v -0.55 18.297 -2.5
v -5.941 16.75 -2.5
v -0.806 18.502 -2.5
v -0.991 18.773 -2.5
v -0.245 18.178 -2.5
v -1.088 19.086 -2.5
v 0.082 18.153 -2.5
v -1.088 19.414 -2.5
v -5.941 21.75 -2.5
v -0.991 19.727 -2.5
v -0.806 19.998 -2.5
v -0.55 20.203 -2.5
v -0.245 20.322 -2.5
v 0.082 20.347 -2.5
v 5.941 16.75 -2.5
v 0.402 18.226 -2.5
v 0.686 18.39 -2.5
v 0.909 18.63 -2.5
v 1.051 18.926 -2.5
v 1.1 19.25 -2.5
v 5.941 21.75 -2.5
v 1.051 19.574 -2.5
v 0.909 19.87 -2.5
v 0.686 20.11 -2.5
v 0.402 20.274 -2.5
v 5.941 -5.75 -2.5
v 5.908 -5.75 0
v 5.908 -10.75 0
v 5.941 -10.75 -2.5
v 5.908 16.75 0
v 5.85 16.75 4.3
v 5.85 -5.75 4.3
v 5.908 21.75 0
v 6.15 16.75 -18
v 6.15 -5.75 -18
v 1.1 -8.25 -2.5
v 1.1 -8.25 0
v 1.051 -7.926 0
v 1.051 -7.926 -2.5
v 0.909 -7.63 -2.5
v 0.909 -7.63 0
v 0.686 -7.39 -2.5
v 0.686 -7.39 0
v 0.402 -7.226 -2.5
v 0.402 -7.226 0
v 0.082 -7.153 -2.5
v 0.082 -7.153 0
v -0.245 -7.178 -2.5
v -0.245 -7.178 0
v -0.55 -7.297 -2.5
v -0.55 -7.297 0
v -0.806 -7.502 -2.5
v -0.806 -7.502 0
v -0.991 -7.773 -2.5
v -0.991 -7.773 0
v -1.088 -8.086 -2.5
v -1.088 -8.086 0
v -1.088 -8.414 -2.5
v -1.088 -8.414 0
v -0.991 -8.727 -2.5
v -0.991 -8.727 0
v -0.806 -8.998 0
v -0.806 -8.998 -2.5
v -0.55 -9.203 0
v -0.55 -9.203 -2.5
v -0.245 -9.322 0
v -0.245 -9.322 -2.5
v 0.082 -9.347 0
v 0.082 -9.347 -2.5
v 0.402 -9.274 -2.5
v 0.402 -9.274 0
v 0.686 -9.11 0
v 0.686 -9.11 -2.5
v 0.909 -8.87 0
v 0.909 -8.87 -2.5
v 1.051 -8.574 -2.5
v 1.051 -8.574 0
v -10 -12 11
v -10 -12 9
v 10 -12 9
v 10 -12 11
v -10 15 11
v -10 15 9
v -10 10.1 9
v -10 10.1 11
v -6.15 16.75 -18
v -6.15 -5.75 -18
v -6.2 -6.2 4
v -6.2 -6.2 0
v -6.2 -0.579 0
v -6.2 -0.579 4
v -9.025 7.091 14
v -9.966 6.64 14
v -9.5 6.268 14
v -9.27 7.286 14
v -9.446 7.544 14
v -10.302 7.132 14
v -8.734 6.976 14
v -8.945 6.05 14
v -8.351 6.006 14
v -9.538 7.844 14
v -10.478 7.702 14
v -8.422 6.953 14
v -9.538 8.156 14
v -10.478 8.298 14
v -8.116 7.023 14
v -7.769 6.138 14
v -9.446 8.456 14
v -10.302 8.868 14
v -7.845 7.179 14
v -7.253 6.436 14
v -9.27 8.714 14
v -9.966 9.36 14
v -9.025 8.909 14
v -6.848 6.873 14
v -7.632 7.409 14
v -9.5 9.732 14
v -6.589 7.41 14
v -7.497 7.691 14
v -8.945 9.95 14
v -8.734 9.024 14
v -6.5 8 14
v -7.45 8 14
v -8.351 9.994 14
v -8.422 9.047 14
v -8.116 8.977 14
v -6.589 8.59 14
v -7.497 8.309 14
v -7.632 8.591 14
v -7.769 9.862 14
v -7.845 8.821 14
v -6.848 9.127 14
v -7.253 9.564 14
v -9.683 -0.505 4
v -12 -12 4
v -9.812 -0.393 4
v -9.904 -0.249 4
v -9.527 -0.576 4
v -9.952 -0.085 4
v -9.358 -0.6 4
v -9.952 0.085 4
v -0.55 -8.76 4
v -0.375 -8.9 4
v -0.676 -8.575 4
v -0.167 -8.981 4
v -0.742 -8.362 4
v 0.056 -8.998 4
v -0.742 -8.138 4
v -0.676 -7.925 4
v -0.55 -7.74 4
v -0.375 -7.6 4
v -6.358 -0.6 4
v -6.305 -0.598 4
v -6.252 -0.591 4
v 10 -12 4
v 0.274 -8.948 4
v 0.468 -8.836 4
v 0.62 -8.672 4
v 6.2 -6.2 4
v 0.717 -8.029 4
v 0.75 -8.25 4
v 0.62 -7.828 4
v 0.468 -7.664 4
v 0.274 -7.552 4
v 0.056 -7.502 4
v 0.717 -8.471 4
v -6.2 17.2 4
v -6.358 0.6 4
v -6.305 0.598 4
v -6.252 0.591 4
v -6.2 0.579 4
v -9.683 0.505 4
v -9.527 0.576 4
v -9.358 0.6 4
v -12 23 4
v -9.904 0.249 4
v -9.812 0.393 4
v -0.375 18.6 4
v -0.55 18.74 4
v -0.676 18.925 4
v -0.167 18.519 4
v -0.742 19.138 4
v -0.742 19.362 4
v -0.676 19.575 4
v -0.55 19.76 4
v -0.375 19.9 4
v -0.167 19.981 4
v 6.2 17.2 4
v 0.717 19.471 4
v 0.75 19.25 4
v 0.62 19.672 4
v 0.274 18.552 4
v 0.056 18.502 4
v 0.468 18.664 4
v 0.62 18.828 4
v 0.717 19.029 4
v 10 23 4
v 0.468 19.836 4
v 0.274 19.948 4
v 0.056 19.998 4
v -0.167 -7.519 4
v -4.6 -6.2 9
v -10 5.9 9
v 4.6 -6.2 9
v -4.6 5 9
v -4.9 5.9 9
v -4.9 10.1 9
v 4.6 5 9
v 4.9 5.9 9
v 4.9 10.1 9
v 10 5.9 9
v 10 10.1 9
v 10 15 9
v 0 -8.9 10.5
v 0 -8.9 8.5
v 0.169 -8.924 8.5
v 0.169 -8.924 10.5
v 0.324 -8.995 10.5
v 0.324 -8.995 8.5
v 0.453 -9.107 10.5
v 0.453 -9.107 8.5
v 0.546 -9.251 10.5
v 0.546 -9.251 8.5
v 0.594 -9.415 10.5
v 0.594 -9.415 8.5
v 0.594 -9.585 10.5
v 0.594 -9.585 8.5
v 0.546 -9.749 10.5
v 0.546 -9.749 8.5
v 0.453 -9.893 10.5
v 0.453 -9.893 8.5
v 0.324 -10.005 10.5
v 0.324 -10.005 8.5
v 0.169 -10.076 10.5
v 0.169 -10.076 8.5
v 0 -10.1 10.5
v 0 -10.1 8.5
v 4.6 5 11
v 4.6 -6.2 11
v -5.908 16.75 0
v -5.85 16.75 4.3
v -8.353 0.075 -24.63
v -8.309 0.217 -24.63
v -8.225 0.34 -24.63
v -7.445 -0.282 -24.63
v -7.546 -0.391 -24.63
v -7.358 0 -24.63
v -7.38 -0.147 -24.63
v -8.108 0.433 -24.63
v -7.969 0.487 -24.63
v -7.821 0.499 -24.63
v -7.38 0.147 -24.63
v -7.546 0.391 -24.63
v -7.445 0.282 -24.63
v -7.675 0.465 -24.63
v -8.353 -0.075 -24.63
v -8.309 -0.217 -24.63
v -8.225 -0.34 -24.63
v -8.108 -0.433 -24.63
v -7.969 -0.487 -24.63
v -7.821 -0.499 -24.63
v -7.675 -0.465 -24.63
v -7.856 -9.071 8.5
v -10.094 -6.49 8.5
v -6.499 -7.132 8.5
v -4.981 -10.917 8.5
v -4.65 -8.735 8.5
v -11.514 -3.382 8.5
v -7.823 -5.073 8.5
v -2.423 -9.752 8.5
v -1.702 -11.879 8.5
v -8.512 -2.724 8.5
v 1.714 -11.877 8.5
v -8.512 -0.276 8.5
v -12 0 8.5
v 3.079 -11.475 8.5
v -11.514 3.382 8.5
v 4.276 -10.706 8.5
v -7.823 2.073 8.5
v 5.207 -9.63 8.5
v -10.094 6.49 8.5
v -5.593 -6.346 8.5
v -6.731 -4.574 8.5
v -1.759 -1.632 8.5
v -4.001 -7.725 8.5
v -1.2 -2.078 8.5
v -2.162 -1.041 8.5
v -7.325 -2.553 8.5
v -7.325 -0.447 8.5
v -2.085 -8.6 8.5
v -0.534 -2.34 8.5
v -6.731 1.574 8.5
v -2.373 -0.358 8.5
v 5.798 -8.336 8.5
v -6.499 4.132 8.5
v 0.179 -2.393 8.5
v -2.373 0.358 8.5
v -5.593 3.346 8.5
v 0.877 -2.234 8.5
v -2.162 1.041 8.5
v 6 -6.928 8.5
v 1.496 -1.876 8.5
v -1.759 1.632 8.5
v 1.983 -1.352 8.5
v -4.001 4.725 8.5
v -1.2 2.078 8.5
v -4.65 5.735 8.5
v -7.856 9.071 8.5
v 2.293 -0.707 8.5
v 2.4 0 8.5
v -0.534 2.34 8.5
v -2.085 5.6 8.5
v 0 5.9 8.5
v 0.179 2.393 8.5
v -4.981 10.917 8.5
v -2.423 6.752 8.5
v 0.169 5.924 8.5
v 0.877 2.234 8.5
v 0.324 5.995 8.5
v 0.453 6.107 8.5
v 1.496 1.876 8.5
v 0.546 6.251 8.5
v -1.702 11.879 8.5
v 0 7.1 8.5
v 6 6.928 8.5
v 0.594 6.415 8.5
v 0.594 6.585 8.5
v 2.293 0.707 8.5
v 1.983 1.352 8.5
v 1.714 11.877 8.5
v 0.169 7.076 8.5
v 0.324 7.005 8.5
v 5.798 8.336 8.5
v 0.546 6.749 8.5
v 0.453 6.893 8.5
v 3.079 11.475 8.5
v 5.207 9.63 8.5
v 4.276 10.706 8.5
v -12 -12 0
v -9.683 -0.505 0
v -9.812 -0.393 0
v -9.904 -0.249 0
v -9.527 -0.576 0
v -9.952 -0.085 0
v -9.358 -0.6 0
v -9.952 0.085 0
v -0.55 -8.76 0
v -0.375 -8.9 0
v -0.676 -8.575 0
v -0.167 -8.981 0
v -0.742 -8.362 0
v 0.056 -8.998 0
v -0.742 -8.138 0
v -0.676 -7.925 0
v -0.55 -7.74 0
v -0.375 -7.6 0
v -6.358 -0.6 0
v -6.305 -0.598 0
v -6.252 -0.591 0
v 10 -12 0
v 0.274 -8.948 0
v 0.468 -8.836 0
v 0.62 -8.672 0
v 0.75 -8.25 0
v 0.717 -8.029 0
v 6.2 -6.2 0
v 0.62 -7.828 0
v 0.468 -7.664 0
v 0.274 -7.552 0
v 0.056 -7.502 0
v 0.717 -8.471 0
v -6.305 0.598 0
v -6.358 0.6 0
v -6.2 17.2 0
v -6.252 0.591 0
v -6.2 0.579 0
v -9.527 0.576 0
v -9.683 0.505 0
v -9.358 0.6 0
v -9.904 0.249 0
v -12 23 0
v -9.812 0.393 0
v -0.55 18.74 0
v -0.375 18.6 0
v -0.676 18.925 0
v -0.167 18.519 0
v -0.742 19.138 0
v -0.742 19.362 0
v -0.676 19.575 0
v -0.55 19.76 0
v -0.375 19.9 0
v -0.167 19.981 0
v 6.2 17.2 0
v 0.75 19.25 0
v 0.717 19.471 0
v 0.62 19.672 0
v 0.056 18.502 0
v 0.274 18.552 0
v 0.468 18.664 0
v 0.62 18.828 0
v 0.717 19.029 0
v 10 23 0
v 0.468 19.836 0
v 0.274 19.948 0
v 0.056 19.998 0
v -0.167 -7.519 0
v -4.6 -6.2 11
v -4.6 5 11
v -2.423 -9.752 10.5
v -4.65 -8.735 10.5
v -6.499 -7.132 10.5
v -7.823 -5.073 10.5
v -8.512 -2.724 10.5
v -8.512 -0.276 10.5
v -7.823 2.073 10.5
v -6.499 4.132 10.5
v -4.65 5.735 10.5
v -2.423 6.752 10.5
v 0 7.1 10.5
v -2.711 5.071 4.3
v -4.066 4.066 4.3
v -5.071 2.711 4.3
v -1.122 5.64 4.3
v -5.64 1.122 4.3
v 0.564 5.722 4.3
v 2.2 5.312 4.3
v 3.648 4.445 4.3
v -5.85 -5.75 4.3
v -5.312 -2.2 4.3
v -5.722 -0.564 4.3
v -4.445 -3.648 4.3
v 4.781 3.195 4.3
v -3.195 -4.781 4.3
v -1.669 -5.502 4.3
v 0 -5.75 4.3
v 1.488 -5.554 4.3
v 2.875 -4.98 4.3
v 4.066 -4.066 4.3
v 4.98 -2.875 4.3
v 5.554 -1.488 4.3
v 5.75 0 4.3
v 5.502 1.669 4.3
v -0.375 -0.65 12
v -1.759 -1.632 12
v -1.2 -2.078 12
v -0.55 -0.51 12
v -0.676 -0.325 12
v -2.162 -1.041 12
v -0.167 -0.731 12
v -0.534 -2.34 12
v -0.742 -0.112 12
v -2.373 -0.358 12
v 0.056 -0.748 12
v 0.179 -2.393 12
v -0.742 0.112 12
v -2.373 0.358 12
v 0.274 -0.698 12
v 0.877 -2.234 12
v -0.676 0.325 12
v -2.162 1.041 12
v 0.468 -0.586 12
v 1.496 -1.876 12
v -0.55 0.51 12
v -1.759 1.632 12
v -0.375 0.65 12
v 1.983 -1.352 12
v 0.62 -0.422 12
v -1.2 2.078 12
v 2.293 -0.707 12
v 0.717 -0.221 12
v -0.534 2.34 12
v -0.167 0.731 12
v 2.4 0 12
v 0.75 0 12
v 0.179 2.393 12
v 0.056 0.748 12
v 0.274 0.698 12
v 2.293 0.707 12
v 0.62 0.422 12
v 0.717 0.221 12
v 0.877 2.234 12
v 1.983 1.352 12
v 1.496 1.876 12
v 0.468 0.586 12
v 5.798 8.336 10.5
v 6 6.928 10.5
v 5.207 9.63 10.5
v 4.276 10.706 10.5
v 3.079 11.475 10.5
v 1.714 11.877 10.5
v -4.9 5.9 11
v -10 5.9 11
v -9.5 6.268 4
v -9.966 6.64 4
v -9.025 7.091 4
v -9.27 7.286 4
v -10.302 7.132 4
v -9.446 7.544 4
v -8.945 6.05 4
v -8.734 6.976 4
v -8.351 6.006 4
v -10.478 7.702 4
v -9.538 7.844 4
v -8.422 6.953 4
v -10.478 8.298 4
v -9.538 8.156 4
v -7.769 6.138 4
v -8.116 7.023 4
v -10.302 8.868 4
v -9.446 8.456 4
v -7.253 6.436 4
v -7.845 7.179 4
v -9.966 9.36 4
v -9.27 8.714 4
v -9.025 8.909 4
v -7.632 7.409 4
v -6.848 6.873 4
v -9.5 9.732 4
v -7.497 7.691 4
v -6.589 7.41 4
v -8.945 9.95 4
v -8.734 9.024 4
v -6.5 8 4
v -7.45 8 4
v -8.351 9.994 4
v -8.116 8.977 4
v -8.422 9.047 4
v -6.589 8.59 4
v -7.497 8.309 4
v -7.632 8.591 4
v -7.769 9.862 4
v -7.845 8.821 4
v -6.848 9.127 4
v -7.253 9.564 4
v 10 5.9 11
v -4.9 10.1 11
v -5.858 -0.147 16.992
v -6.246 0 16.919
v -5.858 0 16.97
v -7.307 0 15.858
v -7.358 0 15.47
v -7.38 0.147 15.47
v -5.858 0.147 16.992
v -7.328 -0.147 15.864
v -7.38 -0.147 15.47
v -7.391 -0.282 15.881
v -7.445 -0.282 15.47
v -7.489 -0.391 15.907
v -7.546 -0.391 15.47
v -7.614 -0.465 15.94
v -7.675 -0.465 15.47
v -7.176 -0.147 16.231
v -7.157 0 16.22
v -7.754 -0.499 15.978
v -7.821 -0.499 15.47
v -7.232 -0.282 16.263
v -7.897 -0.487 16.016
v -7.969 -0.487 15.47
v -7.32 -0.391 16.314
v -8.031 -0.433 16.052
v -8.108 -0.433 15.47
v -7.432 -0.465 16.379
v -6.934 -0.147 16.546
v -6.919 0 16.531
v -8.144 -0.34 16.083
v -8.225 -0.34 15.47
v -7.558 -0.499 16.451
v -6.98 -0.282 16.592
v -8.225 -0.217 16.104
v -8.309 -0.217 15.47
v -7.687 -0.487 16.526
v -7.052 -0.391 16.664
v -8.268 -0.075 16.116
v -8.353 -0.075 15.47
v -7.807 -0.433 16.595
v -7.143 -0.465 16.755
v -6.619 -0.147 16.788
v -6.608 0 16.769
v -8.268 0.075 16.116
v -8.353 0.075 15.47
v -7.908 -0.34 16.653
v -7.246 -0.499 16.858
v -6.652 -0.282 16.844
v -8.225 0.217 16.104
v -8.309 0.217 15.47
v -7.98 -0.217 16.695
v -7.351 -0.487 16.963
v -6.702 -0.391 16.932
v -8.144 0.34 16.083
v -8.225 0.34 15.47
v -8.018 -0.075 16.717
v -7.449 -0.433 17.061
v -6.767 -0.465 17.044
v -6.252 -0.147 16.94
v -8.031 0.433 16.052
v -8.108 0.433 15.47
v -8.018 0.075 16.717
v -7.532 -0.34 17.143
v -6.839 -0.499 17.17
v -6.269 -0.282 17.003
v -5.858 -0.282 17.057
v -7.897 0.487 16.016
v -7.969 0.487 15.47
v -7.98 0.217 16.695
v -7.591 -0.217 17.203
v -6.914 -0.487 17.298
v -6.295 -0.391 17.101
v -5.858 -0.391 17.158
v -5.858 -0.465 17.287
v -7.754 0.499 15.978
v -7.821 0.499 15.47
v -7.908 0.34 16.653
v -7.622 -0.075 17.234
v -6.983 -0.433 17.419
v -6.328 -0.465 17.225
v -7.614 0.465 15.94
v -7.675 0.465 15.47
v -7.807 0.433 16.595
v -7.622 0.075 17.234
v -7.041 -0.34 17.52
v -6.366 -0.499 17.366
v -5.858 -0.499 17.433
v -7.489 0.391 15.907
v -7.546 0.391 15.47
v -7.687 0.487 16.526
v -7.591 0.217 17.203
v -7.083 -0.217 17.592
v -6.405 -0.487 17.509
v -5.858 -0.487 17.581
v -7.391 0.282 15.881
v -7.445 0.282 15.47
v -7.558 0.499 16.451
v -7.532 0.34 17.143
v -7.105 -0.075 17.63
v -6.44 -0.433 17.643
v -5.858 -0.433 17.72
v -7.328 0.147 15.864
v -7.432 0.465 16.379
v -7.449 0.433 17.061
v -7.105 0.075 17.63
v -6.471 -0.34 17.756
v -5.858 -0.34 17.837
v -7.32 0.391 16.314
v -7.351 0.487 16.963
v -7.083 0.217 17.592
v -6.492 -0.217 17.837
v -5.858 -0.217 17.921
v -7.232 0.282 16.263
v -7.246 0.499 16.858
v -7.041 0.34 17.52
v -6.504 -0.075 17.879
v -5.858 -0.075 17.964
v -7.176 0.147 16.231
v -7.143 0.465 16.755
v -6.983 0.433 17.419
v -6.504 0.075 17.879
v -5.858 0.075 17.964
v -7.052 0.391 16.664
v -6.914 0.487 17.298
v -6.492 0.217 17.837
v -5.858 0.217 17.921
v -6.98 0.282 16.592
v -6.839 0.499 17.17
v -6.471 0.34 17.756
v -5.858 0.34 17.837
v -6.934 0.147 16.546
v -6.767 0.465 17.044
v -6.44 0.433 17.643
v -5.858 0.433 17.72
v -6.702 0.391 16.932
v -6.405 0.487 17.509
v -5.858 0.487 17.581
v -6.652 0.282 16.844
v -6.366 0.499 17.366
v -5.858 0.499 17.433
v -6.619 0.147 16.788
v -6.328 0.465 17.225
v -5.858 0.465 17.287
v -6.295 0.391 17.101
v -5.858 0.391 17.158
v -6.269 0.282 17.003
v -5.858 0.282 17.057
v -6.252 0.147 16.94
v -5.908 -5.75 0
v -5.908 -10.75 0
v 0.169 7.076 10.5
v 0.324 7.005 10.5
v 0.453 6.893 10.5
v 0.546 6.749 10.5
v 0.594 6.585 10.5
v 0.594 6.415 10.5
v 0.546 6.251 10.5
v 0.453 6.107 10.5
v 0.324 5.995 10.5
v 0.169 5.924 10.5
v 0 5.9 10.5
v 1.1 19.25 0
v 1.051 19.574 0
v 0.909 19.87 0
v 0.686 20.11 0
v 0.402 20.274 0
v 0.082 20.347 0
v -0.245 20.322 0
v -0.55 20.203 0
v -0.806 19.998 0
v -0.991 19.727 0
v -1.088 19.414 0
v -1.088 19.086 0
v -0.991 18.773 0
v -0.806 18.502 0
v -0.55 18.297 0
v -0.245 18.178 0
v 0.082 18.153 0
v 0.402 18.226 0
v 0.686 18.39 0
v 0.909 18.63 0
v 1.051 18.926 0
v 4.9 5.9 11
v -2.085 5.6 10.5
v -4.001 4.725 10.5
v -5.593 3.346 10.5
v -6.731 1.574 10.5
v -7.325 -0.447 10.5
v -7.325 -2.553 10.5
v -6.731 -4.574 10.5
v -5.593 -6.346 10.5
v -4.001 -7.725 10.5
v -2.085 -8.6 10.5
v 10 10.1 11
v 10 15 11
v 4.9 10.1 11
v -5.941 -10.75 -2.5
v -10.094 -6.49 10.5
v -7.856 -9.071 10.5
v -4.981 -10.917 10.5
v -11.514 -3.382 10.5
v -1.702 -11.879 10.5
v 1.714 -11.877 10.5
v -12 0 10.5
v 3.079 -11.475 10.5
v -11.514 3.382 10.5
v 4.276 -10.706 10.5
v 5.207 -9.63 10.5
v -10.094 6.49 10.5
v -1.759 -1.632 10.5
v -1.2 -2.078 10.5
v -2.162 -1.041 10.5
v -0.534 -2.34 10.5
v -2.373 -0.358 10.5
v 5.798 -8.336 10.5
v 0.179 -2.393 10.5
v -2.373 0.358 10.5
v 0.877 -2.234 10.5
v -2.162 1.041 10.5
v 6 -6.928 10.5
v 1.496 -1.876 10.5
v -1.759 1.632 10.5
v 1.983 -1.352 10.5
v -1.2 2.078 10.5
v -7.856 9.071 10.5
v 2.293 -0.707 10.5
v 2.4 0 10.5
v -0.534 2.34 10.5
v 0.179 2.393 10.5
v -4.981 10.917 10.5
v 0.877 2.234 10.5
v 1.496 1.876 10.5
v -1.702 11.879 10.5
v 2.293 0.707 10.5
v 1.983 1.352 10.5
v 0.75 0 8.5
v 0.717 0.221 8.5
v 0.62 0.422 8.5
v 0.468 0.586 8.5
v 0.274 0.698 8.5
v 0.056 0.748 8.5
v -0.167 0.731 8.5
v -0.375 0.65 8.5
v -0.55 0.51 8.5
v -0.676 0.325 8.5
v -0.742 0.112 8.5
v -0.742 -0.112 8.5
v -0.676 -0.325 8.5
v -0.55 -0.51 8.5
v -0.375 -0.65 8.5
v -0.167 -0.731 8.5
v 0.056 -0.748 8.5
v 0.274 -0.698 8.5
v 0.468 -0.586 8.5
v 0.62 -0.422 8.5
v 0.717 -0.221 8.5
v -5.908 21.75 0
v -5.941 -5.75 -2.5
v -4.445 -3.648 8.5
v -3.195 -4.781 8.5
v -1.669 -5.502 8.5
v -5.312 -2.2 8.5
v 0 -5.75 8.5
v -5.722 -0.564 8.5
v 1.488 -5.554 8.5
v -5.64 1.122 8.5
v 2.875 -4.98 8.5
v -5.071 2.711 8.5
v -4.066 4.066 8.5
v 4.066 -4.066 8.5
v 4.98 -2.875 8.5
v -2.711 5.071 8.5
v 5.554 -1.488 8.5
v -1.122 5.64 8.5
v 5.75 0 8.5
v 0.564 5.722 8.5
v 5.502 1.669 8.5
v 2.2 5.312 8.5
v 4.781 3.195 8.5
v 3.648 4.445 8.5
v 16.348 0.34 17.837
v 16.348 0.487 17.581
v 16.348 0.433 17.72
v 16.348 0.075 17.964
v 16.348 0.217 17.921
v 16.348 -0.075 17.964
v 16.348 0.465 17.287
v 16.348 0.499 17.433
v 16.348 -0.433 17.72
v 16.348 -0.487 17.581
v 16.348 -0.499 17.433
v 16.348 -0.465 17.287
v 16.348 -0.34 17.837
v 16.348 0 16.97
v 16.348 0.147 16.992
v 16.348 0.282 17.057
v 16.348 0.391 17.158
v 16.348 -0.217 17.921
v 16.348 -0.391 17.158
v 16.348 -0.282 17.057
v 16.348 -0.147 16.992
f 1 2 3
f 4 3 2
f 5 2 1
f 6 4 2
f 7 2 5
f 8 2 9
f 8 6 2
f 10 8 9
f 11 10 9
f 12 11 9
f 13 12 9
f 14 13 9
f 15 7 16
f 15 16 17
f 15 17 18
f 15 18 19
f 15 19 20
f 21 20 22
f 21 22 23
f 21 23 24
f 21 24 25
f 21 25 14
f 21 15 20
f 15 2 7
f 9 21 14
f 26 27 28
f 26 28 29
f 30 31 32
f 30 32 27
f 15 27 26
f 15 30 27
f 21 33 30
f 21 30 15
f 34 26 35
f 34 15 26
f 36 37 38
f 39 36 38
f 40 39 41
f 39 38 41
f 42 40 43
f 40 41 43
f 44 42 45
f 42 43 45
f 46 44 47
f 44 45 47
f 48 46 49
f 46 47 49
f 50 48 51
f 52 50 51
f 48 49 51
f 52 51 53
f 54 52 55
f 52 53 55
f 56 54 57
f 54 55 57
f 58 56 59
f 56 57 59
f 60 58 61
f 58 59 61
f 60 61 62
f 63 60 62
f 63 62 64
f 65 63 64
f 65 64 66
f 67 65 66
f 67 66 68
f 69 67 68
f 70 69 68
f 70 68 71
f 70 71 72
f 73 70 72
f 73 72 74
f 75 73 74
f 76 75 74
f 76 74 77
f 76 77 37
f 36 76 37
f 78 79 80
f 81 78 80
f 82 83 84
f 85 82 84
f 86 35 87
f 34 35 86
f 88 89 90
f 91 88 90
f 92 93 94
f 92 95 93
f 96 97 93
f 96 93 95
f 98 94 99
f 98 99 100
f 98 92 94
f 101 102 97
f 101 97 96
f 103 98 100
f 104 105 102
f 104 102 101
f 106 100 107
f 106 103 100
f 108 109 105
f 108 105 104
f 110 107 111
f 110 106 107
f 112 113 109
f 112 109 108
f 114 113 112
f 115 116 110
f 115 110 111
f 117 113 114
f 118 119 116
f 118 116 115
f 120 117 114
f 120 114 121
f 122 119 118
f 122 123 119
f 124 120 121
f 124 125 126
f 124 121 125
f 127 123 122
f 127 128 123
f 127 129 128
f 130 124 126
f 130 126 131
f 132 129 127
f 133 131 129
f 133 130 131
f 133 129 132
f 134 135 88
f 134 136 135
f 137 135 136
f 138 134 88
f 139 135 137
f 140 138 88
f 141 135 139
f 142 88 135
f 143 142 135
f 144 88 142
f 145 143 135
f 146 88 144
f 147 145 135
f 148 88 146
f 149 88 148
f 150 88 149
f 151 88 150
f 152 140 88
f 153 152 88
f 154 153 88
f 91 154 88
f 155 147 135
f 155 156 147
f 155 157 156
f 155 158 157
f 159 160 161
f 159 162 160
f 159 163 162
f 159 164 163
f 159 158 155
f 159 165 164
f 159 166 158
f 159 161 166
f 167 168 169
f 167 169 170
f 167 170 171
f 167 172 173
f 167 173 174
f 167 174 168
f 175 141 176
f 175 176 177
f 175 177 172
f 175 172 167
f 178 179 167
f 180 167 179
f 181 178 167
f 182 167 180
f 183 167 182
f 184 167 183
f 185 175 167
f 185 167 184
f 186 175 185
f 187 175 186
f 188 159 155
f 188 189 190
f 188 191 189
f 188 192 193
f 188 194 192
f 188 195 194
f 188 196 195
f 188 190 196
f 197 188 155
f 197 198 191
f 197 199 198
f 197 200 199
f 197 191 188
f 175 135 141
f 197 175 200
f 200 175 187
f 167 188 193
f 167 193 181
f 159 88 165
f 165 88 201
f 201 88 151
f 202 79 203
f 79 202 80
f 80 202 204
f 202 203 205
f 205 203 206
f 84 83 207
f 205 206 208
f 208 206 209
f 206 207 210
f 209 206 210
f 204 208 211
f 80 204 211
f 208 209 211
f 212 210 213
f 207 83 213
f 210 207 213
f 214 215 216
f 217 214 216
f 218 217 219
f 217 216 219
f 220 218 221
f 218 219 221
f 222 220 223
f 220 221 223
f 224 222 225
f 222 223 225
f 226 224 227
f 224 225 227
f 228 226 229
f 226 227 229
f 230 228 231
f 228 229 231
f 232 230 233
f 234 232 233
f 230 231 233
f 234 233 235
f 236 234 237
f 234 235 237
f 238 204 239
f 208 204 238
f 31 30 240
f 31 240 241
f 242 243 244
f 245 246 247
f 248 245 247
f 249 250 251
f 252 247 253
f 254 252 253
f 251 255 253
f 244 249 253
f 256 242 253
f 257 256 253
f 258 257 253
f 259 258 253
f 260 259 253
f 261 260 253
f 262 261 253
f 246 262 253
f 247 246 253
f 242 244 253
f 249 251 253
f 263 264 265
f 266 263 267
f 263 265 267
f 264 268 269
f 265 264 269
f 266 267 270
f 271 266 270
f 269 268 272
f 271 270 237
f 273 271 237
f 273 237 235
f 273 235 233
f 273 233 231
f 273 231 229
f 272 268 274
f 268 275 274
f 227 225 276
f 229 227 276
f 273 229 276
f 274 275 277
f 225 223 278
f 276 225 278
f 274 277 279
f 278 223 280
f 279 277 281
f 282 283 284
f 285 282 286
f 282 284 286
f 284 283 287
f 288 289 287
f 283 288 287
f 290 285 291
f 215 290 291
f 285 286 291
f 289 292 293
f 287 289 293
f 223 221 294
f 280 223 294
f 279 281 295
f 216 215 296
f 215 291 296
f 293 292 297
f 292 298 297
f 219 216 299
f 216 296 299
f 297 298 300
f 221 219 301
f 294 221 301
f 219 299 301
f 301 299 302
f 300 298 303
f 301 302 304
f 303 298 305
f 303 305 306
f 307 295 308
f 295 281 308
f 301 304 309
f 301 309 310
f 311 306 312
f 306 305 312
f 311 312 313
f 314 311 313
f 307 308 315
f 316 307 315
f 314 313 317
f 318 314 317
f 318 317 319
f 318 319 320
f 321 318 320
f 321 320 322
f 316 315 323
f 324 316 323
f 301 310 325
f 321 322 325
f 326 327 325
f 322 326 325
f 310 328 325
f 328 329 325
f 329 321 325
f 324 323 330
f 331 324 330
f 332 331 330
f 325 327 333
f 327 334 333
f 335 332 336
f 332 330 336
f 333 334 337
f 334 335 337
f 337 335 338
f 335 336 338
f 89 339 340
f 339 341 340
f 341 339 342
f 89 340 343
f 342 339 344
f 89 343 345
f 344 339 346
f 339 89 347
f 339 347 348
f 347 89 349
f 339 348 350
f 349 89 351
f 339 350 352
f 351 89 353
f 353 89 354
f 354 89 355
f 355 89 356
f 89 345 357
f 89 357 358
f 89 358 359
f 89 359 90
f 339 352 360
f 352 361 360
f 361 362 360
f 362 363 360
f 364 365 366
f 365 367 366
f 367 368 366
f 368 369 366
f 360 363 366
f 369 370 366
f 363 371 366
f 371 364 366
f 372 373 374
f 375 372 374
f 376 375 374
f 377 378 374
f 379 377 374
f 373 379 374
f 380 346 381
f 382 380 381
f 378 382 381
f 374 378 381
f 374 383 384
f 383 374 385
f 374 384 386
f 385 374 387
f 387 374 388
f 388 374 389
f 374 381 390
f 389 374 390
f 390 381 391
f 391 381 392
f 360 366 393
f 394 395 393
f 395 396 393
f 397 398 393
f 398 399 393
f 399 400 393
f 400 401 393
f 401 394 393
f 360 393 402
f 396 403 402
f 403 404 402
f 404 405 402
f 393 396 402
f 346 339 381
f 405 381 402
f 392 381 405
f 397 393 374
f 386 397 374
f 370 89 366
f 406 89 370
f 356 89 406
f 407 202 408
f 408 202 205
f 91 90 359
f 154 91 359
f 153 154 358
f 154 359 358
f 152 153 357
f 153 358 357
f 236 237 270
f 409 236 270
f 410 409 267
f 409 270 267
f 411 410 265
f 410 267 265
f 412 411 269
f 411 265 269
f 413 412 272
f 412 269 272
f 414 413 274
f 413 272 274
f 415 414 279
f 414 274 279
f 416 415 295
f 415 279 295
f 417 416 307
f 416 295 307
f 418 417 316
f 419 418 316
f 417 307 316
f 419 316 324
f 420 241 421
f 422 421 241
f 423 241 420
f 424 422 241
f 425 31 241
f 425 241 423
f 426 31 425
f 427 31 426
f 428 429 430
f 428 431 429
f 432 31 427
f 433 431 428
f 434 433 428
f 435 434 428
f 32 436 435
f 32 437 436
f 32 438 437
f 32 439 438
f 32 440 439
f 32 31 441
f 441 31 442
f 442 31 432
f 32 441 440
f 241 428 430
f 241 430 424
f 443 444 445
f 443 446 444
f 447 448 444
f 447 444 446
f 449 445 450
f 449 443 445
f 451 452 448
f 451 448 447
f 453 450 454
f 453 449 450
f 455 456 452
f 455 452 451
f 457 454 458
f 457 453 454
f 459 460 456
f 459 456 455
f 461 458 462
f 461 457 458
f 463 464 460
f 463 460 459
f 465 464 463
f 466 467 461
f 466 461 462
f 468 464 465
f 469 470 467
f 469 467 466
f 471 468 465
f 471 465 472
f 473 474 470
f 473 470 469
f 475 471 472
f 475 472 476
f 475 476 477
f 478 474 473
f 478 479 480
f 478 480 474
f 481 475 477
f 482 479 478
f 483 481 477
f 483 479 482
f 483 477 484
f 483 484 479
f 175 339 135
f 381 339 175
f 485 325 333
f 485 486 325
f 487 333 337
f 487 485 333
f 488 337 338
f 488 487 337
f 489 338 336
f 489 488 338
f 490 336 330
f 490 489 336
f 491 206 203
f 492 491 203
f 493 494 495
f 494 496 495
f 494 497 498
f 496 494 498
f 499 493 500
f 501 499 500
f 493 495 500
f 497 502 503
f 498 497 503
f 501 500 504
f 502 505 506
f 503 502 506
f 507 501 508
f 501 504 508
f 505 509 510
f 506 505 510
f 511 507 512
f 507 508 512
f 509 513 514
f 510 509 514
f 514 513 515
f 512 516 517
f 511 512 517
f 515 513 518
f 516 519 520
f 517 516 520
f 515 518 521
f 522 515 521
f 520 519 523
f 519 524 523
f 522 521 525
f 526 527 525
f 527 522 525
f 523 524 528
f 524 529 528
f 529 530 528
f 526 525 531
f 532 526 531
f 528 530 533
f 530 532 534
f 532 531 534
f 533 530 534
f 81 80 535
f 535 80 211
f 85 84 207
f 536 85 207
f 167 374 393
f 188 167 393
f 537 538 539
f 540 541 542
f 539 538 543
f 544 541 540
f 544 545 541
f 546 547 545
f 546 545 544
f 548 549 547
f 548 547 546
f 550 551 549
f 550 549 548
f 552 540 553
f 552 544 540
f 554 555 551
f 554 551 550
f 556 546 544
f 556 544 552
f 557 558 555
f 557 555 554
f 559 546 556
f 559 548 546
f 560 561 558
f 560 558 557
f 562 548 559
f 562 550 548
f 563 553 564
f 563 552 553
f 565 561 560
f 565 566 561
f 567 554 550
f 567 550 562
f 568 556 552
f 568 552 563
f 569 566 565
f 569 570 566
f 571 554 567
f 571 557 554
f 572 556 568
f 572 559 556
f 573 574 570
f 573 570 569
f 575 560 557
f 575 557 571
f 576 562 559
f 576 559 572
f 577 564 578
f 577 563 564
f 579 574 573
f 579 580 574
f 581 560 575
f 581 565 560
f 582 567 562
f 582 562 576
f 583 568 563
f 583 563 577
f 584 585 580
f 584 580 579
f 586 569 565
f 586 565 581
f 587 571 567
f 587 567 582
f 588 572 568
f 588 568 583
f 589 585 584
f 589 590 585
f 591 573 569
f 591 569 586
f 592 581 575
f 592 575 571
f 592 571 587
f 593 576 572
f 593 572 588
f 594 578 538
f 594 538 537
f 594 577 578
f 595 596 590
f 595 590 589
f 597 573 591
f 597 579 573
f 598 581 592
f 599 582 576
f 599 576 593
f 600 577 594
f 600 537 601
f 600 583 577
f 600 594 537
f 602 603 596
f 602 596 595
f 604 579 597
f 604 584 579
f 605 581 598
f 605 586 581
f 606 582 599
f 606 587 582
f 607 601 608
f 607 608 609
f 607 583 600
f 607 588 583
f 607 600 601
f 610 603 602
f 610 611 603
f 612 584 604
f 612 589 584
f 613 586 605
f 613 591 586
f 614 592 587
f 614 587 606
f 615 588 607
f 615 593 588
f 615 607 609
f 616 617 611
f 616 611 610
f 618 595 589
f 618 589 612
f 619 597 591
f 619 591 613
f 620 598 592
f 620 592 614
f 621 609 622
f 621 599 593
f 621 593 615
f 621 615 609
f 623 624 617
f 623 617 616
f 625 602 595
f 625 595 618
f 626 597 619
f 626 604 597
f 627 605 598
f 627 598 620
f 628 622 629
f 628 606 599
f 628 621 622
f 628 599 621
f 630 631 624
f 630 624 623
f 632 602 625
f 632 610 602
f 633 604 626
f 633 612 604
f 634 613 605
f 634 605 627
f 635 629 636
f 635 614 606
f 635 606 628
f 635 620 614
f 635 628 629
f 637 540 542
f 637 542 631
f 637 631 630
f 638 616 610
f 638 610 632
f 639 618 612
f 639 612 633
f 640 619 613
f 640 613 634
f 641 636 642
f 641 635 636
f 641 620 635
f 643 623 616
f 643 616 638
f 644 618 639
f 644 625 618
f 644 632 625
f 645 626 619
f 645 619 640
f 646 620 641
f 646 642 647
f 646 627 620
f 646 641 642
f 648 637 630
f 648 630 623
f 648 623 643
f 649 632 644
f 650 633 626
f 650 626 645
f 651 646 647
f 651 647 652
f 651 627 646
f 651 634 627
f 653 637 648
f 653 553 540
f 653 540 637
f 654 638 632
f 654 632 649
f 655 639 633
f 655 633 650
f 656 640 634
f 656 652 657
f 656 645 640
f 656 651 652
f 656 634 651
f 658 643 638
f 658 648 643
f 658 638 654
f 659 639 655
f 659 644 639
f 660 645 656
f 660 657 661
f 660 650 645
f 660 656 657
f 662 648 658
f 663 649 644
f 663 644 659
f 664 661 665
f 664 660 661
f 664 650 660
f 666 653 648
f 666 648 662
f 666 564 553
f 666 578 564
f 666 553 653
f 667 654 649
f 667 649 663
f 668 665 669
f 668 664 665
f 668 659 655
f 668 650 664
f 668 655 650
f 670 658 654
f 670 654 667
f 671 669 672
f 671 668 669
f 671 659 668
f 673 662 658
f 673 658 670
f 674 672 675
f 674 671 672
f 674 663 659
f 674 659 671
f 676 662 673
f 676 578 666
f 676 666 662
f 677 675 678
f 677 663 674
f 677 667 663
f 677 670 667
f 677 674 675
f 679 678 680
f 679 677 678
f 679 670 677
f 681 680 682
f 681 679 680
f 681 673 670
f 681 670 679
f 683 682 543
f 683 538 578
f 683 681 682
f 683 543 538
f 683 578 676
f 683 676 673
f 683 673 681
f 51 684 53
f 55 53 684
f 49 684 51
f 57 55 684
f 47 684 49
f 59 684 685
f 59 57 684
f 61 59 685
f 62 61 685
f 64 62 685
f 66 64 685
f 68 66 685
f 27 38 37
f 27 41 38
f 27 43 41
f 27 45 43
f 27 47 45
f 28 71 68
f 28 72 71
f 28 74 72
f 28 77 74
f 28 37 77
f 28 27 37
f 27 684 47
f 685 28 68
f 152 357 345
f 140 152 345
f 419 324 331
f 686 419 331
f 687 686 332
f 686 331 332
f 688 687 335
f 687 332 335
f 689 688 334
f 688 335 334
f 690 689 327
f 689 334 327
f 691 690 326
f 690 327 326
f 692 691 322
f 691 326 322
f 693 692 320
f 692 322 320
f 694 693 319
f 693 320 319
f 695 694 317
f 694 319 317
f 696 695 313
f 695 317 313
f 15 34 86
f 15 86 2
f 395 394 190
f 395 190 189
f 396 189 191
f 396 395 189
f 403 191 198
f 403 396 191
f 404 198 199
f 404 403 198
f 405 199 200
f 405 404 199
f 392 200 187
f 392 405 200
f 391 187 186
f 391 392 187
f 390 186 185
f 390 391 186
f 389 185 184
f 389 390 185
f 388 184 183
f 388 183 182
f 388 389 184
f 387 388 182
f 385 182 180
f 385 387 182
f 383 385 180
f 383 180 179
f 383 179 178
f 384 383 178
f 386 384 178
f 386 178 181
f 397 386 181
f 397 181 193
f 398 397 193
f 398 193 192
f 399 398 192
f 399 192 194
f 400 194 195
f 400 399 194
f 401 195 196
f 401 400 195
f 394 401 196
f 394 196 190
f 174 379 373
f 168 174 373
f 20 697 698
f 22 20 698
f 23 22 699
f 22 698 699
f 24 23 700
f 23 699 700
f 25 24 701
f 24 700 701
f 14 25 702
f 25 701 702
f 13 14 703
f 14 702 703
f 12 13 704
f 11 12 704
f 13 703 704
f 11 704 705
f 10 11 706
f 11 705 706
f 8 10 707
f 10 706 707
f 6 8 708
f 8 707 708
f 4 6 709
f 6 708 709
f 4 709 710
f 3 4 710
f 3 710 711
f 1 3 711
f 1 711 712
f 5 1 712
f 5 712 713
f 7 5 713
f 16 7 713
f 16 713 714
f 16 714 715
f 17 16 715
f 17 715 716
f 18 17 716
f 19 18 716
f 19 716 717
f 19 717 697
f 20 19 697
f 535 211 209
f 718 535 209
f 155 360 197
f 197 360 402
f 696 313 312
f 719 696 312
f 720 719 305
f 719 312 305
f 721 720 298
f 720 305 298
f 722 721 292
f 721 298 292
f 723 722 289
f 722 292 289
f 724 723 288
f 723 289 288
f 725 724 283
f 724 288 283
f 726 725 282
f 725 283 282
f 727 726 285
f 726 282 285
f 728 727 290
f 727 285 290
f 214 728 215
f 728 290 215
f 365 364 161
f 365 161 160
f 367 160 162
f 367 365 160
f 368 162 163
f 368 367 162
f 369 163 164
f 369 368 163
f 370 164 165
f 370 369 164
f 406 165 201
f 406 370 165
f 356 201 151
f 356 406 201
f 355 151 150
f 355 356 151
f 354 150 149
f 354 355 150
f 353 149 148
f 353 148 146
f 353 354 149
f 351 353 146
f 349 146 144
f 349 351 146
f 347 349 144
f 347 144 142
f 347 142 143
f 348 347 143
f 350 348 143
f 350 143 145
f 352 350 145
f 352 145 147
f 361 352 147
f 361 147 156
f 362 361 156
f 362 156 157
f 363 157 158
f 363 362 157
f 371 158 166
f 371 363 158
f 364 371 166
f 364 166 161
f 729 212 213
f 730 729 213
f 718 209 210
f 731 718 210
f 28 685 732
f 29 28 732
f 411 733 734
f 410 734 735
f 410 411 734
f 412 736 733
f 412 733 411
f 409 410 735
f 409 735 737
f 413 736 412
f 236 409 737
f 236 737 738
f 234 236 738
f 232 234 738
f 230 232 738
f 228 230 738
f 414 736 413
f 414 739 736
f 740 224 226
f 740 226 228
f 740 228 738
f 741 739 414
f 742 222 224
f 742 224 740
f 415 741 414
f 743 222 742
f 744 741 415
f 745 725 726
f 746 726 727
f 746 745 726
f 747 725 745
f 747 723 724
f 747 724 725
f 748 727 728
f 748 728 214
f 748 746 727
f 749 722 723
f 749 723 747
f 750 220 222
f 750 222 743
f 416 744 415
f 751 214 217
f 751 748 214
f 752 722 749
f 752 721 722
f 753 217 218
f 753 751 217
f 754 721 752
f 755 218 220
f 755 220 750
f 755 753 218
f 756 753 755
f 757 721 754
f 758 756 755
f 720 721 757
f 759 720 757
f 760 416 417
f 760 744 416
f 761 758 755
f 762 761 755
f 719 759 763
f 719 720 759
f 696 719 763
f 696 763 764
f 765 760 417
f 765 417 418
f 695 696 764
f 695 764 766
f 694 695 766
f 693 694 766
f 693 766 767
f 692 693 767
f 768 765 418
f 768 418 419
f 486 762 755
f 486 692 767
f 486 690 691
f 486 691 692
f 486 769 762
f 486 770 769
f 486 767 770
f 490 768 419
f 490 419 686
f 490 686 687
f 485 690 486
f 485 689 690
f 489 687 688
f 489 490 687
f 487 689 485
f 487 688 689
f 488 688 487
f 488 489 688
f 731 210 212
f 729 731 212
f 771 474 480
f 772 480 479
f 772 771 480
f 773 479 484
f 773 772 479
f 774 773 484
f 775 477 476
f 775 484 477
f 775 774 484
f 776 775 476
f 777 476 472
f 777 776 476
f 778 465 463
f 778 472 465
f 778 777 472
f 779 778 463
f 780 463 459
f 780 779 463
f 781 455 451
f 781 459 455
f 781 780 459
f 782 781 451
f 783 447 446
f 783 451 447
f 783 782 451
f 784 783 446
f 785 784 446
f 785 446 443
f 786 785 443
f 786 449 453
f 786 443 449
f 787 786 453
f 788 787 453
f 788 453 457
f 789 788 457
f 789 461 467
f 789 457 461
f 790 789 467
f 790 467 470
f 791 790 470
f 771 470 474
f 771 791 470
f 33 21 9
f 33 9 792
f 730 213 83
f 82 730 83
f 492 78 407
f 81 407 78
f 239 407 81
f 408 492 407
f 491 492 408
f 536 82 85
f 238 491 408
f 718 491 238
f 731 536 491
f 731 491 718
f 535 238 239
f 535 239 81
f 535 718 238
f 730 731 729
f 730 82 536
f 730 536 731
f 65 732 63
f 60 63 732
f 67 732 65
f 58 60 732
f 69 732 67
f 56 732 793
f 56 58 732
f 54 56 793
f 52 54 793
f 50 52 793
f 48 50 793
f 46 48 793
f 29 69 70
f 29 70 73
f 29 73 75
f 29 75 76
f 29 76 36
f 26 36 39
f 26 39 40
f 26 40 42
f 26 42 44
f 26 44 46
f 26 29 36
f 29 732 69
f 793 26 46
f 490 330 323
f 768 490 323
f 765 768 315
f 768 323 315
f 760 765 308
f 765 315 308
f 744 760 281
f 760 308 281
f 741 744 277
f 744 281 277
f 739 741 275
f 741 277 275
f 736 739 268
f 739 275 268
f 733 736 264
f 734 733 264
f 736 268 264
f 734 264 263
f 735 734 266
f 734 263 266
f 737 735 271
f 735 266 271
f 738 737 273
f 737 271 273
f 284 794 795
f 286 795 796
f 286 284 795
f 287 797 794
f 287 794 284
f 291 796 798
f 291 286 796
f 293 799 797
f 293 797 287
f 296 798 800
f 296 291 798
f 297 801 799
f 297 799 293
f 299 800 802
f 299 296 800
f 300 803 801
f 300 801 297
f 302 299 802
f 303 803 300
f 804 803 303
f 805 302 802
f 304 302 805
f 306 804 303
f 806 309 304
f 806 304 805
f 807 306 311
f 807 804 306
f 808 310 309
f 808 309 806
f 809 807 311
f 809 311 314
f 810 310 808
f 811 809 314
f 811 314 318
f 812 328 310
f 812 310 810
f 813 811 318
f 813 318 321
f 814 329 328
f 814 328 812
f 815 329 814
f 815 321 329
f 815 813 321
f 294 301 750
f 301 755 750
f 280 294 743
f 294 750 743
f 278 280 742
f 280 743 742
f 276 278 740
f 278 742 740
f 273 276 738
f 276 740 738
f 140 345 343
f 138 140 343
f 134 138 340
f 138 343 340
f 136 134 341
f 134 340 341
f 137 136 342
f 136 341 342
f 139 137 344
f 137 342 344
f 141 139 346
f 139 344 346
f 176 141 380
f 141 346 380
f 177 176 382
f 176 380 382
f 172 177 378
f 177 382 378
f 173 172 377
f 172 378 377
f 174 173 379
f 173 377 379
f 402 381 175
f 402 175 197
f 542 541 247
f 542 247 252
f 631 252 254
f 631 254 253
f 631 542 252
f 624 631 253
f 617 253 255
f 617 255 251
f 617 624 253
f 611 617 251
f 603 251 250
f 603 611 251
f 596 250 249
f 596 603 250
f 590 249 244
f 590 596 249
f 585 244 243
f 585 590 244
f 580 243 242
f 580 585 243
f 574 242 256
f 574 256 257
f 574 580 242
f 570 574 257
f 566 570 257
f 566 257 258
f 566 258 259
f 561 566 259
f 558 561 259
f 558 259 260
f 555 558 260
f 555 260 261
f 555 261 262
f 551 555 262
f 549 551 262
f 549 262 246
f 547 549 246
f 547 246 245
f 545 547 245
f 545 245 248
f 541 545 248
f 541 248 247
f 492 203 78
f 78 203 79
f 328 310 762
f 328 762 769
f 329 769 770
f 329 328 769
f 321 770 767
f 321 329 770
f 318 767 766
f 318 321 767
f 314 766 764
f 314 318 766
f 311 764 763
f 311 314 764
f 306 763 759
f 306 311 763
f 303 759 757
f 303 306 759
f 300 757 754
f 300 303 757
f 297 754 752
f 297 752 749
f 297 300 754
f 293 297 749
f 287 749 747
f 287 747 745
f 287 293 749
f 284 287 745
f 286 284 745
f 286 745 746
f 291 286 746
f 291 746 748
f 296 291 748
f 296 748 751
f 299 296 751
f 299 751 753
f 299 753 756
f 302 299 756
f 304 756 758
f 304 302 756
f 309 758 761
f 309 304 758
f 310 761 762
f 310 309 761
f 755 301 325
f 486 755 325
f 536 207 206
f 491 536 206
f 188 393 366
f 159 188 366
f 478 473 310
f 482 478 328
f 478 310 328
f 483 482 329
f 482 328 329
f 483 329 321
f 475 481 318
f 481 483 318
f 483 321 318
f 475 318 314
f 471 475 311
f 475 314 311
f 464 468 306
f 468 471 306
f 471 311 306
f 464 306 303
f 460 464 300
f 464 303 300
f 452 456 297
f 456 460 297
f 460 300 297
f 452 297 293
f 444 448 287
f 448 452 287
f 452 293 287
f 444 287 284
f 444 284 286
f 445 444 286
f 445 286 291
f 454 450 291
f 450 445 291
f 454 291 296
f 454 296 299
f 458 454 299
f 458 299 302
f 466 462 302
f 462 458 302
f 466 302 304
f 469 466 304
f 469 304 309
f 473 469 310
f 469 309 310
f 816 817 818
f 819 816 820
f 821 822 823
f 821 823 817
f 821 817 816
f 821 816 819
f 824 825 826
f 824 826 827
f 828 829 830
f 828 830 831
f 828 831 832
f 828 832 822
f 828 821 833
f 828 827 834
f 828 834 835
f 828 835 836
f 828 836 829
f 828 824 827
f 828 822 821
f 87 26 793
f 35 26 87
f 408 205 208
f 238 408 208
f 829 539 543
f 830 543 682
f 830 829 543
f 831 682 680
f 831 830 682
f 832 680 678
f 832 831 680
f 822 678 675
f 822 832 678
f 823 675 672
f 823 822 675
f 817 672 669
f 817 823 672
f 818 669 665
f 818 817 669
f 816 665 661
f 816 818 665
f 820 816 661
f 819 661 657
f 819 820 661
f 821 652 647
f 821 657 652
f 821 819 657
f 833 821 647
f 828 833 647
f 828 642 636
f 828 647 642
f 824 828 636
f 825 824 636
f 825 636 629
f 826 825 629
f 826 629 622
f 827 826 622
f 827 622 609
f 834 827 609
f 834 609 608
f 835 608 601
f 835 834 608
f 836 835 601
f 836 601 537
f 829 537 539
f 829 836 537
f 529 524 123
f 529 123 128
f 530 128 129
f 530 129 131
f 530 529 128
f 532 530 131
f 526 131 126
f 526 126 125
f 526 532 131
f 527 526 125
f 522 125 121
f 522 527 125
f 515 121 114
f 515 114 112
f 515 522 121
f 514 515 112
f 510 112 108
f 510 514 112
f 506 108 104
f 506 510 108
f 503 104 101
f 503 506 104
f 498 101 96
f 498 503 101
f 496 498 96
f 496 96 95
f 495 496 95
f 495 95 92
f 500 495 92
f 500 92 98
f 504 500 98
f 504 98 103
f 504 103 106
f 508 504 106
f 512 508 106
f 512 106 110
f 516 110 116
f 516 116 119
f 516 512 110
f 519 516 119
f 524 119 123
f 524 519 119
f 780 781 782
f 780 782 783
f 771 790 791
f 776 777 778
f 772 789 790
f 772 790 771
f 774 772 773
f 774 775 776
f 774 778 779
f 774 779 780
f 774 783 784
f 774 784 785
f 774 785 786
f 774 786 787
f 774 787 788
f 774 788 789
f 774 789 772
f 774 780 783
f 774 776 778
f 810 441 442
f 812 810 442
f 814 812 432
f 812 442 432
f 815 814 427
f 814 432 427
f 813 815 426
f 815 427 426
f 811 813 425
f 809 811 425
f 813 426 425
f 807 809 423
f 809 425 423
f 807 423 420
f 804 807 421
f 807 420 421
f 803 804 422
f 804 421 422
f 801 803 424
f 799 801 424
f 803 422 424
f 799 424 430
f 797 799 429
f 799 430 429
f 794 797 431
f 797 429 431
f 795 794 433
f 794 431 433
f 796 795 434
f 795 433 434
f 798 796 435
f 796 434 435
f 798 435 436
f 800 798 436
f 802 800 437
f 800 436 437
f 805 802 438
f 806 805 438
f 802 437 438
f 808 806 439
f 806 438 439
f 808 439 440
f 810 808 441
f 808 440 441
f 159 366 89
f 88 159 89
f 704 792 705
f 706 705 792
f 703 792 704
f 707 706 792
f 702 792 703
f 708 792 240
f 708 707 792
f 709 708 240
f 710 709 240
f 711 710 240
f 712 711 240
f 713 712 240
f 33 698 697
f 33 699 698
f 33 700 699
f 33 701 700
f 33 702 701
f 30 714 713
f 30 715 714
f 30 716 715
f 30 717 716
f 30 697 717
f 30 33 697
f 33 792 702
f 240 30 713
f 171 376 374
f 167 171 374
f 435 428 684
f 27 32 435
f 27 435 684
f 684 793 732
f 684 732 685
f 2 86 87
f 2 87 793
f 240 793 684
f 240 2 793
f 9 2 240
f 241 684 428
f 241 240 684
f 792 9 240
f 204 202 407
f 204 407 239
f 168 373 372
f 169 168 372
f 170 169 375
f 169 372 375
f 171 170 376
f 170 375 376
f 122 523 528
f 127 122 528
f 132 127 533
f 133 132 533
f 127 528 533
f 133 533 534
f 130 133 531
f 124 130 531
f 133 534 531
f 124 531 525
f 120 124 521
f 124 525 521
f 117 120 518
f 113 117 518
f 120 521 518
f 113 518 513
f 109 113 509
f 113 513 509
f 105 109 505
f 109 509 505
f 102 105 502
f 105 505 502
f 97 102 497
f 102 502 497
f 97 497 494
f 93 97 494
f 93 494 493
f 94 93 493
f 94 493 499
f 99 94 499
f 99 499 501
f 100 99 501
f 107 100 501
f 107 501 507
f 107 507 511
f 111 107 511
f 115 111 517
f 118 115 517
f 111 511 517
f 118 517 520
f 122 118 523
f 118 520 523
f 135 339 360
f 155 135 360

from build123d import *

# Parameters (mm, degrees)
F4_DEPTH       = 7.5
F5_R           = 1.1
F6_DEPTH       = 18.001
F8_DEPTH       = 4.2
F9_R           = 2.4
F9_R_2         = 0.75
F10_DEPTH      = 3.5
F12_DEPTH      = 10.751
F12_DEPTH_BACK = 21.751
F13_R          = 2.4
F14_DEPTH      = 2
F16_W          = 9.2
F16_H          = 11.2
F17_DEPTH      = 2
F18_W          = 22
F18_H          = 35
F18_R          = 0.75
F19_DEPTH      = 4
F20_R          = 2
F20_R_2        = 1.05
F21_DEPTH      = 10
F22_R          = 0.5
F24_R          = 5


with BuildPart() as f4:
    # F3 (on Right) → F4 (new body, symmetric)
    with BuildSketch(Plane.YZ):
        Polygon((-5.75, 0), (-10.75, 0), (-10.75, -2.5), (-5.75, -2.5), (-5.75, -18), (16.75, -18), (16.75, -2.5), (21.75, -2.5), (21.75, 0), (16.75, 0), (16.75, 4.3), (-5.75, 4.3), align=None)
    extrude(amount=F4_DEPTH, both=True)

    # F5 (on Top) → F6 (cut, through all)
    with BuildSketch(Plane.XY):
        with Locations((0, -8.25)):
            Circle(F5_R)
        with Locations((0, 19.25)):
            Circle(F5_R)
    extrude(amount=-F6_DEPTH, mode=Mode.SUBTRACT)

    # F7 (on face) → F8 (join)
    with BuildSketch(Plane.XY.offset(4.3)):
        with BuildLine():
            ThreePointArc((0, -5.75), (4.0658639918, -4.0658639918), (5.75, 0))
            ThreePointArc((5.75, 0), (-4.0658639918, 4.0658639918), (0, -5.75))
        make_face()
    extrude(amount=F8_DEPTH)

    # F9 (on face) → F10 (join)
    with BuildSketch(Plane.XY.offset(8.5)):
        Circle(F9_R)
        Circle(F9_R_2, mode=Mode.SUBTRACT)
    extrude(amount=F10_DEPTH)

    # F11 (on Front) → F12 (cut, two sides)
    with BuildSketch(Plane.XZ) as f12_sk:
        Polygon((-10.8185609129, -18), (-6.15, -18), (-5.85, 4.3), (-5.85, 12), (5.85, 12), (5.85, 4.3), (6.15, -18), (12.056059204, -18), (12.056059204, 17.8524129022), (-10.8185609129, 17.8524129022), align=None)
    extrude(amount=F12_DEPTH, mode=Mode.SUBTRACT)
    extrude(f12_sk.sketch, amount=-F12_DEPTH_BACK, mode=Mode.SUBTRACT)


with BuildPart() as f14:
    # F13 (on face) → F14 (new body)
    with BuildSketch(Plane.XY.offset(8.5)):
        with BuildLine():
            Line((6, -10.3923048454), (6, 10.3923048454))
            ThreePointArc((6, 10.3923048454), (-12, 0), (6, -10.3923048454))
        make_face()
        with BuildLine():
            ThreePointArc((0, -10.1), (-8.6, -1.5), (0, 7.1))
            ThreePointArc((0, 7.1), (0.6, 6.5), (0, 5.9))
            ThreePointArc((0, 5.9), (-7.4, -1.5), (0, -8.9))
            ThreePointArc((0, -8.9), (0.6, -9.5), (0, -10.1))
        make_face(mode=Mode.SUBTRACT)
        Circle(F13_R, mode=Mode.SUBTRACT)
    extrude(amount=F14_DEPTH)

    # F24
    f24_edges = [f14.edges().sort_by_distance(p)[0] for p in [
        (6, -10.392305, 9.5),
        (6, 10.392305, 9.5),
    ]]
    fillet(f24_edges, radius=F24_R)


with BuildPart() as f17:
    # F16 (on offset) → F17 (new body)
    with BuildSketch(Plane.XY.offset(9)):
        Polygon((10, 15), (-10, 15), (-10, 10.1), (-4.9, 10.1), (-4.9, 5.9), (-10, 5.9), (-10, -12), (10, -12), (10, 5.9), (4.9, 5.9), (4.9, 10.1), (10, 10.1), align=None)
        with Locations((0, -0.6)):
            Rectangle(F16_W, F16_H, mode=Mode.SUBTRACT)
    extrude(amount=F17_DEPTH)


with BuildPart() as f19:
    # F18 (on Top) → F19 (new body)
    with BuildSketch(Plane.XY):
        with Locations((-1, 5.5)):
            Rectangle(F18_W, F18_H)
        with Locations((0, -8.25)):
            Circle(F18_R, mode=Mode.SUBTRACT)
        with BuildLine():
            Line((-6.2, 0.5787910421), (-6.2, 17.2))
            Line((-6.2, 17.2), (6.2, 17.2))
            Line((6.2, 17.2), (6.2, -6.2))
            Line((6.2, -6.2), (-6.2, -6.2))
            Line((-6.2, -6.2), (-6.2, -0.5787910421))
            ThreePointArc((-6.2, -0.5787910421), (-6.2783503675, -0.594674123), (-6.3581168228, -0.6))
            Line((-6.3581168228, -0.6), (-9.3581168228, -0.6))
            ThreePointArc((-9.3581168228, -0.6), (-9.9581168228, 0), (-9.3581168228, 0.6))
            Line((-9.3581168228, 0.6), (-6.3581168228, 0.6))
            ThreePointArc((-6.3581168228, 0.6), (-6.2783503675, 0.594674123), (-6.2, 0.5787910421))
        make_face(mode=Mode.SUBTRACT)
        with Locations((0, 19.25)):
            Circle(F18_R, mode=Mode.SUBTRACT)
    extrude(amount=F19_DEPTH)


with BuildPart() as f21:
    # F20 (on face) → F21 (new body)
    with BuildSketch(Plane.XY.offset(4)):
        with Locations((-8.5, 8)):
            Circle(F20_R)
        with Locations((-8.5, 8)):
            Circle(F20_R_2, mode=Mode.SUBTRACT)
    extrude(amount=F21_DEPTH)


with BuildPart() as f23:
    # F23: sweep along a path in F1
    with BuildLine(Plane.XZ) as f23_path:
        Line((-7.8581168228, -24.6301926672), (-7.8581168228, 15.4700445116))
        ThreePointArc((-7.8581168228, 15.4700445116), (-7.2723303851, 16.8842580739), (-5.8581168228, 17.4700445116))
        Line((-5.8581168228, 17.4700445116), (16.3483962125, 17.4700445116))
    # F22 (on plane+point) → F23 (sweep)
    with BuildSketch(Plane.XY.offset(-24.6301926672)):
        with Locations((-7.8581168228, 0)):
            Circle(F22_R)
    sweep(path=f23_path.line)


solid = Compound([f4.part, f14.part, f17.part, f19.part, f21.part, f23.part])
